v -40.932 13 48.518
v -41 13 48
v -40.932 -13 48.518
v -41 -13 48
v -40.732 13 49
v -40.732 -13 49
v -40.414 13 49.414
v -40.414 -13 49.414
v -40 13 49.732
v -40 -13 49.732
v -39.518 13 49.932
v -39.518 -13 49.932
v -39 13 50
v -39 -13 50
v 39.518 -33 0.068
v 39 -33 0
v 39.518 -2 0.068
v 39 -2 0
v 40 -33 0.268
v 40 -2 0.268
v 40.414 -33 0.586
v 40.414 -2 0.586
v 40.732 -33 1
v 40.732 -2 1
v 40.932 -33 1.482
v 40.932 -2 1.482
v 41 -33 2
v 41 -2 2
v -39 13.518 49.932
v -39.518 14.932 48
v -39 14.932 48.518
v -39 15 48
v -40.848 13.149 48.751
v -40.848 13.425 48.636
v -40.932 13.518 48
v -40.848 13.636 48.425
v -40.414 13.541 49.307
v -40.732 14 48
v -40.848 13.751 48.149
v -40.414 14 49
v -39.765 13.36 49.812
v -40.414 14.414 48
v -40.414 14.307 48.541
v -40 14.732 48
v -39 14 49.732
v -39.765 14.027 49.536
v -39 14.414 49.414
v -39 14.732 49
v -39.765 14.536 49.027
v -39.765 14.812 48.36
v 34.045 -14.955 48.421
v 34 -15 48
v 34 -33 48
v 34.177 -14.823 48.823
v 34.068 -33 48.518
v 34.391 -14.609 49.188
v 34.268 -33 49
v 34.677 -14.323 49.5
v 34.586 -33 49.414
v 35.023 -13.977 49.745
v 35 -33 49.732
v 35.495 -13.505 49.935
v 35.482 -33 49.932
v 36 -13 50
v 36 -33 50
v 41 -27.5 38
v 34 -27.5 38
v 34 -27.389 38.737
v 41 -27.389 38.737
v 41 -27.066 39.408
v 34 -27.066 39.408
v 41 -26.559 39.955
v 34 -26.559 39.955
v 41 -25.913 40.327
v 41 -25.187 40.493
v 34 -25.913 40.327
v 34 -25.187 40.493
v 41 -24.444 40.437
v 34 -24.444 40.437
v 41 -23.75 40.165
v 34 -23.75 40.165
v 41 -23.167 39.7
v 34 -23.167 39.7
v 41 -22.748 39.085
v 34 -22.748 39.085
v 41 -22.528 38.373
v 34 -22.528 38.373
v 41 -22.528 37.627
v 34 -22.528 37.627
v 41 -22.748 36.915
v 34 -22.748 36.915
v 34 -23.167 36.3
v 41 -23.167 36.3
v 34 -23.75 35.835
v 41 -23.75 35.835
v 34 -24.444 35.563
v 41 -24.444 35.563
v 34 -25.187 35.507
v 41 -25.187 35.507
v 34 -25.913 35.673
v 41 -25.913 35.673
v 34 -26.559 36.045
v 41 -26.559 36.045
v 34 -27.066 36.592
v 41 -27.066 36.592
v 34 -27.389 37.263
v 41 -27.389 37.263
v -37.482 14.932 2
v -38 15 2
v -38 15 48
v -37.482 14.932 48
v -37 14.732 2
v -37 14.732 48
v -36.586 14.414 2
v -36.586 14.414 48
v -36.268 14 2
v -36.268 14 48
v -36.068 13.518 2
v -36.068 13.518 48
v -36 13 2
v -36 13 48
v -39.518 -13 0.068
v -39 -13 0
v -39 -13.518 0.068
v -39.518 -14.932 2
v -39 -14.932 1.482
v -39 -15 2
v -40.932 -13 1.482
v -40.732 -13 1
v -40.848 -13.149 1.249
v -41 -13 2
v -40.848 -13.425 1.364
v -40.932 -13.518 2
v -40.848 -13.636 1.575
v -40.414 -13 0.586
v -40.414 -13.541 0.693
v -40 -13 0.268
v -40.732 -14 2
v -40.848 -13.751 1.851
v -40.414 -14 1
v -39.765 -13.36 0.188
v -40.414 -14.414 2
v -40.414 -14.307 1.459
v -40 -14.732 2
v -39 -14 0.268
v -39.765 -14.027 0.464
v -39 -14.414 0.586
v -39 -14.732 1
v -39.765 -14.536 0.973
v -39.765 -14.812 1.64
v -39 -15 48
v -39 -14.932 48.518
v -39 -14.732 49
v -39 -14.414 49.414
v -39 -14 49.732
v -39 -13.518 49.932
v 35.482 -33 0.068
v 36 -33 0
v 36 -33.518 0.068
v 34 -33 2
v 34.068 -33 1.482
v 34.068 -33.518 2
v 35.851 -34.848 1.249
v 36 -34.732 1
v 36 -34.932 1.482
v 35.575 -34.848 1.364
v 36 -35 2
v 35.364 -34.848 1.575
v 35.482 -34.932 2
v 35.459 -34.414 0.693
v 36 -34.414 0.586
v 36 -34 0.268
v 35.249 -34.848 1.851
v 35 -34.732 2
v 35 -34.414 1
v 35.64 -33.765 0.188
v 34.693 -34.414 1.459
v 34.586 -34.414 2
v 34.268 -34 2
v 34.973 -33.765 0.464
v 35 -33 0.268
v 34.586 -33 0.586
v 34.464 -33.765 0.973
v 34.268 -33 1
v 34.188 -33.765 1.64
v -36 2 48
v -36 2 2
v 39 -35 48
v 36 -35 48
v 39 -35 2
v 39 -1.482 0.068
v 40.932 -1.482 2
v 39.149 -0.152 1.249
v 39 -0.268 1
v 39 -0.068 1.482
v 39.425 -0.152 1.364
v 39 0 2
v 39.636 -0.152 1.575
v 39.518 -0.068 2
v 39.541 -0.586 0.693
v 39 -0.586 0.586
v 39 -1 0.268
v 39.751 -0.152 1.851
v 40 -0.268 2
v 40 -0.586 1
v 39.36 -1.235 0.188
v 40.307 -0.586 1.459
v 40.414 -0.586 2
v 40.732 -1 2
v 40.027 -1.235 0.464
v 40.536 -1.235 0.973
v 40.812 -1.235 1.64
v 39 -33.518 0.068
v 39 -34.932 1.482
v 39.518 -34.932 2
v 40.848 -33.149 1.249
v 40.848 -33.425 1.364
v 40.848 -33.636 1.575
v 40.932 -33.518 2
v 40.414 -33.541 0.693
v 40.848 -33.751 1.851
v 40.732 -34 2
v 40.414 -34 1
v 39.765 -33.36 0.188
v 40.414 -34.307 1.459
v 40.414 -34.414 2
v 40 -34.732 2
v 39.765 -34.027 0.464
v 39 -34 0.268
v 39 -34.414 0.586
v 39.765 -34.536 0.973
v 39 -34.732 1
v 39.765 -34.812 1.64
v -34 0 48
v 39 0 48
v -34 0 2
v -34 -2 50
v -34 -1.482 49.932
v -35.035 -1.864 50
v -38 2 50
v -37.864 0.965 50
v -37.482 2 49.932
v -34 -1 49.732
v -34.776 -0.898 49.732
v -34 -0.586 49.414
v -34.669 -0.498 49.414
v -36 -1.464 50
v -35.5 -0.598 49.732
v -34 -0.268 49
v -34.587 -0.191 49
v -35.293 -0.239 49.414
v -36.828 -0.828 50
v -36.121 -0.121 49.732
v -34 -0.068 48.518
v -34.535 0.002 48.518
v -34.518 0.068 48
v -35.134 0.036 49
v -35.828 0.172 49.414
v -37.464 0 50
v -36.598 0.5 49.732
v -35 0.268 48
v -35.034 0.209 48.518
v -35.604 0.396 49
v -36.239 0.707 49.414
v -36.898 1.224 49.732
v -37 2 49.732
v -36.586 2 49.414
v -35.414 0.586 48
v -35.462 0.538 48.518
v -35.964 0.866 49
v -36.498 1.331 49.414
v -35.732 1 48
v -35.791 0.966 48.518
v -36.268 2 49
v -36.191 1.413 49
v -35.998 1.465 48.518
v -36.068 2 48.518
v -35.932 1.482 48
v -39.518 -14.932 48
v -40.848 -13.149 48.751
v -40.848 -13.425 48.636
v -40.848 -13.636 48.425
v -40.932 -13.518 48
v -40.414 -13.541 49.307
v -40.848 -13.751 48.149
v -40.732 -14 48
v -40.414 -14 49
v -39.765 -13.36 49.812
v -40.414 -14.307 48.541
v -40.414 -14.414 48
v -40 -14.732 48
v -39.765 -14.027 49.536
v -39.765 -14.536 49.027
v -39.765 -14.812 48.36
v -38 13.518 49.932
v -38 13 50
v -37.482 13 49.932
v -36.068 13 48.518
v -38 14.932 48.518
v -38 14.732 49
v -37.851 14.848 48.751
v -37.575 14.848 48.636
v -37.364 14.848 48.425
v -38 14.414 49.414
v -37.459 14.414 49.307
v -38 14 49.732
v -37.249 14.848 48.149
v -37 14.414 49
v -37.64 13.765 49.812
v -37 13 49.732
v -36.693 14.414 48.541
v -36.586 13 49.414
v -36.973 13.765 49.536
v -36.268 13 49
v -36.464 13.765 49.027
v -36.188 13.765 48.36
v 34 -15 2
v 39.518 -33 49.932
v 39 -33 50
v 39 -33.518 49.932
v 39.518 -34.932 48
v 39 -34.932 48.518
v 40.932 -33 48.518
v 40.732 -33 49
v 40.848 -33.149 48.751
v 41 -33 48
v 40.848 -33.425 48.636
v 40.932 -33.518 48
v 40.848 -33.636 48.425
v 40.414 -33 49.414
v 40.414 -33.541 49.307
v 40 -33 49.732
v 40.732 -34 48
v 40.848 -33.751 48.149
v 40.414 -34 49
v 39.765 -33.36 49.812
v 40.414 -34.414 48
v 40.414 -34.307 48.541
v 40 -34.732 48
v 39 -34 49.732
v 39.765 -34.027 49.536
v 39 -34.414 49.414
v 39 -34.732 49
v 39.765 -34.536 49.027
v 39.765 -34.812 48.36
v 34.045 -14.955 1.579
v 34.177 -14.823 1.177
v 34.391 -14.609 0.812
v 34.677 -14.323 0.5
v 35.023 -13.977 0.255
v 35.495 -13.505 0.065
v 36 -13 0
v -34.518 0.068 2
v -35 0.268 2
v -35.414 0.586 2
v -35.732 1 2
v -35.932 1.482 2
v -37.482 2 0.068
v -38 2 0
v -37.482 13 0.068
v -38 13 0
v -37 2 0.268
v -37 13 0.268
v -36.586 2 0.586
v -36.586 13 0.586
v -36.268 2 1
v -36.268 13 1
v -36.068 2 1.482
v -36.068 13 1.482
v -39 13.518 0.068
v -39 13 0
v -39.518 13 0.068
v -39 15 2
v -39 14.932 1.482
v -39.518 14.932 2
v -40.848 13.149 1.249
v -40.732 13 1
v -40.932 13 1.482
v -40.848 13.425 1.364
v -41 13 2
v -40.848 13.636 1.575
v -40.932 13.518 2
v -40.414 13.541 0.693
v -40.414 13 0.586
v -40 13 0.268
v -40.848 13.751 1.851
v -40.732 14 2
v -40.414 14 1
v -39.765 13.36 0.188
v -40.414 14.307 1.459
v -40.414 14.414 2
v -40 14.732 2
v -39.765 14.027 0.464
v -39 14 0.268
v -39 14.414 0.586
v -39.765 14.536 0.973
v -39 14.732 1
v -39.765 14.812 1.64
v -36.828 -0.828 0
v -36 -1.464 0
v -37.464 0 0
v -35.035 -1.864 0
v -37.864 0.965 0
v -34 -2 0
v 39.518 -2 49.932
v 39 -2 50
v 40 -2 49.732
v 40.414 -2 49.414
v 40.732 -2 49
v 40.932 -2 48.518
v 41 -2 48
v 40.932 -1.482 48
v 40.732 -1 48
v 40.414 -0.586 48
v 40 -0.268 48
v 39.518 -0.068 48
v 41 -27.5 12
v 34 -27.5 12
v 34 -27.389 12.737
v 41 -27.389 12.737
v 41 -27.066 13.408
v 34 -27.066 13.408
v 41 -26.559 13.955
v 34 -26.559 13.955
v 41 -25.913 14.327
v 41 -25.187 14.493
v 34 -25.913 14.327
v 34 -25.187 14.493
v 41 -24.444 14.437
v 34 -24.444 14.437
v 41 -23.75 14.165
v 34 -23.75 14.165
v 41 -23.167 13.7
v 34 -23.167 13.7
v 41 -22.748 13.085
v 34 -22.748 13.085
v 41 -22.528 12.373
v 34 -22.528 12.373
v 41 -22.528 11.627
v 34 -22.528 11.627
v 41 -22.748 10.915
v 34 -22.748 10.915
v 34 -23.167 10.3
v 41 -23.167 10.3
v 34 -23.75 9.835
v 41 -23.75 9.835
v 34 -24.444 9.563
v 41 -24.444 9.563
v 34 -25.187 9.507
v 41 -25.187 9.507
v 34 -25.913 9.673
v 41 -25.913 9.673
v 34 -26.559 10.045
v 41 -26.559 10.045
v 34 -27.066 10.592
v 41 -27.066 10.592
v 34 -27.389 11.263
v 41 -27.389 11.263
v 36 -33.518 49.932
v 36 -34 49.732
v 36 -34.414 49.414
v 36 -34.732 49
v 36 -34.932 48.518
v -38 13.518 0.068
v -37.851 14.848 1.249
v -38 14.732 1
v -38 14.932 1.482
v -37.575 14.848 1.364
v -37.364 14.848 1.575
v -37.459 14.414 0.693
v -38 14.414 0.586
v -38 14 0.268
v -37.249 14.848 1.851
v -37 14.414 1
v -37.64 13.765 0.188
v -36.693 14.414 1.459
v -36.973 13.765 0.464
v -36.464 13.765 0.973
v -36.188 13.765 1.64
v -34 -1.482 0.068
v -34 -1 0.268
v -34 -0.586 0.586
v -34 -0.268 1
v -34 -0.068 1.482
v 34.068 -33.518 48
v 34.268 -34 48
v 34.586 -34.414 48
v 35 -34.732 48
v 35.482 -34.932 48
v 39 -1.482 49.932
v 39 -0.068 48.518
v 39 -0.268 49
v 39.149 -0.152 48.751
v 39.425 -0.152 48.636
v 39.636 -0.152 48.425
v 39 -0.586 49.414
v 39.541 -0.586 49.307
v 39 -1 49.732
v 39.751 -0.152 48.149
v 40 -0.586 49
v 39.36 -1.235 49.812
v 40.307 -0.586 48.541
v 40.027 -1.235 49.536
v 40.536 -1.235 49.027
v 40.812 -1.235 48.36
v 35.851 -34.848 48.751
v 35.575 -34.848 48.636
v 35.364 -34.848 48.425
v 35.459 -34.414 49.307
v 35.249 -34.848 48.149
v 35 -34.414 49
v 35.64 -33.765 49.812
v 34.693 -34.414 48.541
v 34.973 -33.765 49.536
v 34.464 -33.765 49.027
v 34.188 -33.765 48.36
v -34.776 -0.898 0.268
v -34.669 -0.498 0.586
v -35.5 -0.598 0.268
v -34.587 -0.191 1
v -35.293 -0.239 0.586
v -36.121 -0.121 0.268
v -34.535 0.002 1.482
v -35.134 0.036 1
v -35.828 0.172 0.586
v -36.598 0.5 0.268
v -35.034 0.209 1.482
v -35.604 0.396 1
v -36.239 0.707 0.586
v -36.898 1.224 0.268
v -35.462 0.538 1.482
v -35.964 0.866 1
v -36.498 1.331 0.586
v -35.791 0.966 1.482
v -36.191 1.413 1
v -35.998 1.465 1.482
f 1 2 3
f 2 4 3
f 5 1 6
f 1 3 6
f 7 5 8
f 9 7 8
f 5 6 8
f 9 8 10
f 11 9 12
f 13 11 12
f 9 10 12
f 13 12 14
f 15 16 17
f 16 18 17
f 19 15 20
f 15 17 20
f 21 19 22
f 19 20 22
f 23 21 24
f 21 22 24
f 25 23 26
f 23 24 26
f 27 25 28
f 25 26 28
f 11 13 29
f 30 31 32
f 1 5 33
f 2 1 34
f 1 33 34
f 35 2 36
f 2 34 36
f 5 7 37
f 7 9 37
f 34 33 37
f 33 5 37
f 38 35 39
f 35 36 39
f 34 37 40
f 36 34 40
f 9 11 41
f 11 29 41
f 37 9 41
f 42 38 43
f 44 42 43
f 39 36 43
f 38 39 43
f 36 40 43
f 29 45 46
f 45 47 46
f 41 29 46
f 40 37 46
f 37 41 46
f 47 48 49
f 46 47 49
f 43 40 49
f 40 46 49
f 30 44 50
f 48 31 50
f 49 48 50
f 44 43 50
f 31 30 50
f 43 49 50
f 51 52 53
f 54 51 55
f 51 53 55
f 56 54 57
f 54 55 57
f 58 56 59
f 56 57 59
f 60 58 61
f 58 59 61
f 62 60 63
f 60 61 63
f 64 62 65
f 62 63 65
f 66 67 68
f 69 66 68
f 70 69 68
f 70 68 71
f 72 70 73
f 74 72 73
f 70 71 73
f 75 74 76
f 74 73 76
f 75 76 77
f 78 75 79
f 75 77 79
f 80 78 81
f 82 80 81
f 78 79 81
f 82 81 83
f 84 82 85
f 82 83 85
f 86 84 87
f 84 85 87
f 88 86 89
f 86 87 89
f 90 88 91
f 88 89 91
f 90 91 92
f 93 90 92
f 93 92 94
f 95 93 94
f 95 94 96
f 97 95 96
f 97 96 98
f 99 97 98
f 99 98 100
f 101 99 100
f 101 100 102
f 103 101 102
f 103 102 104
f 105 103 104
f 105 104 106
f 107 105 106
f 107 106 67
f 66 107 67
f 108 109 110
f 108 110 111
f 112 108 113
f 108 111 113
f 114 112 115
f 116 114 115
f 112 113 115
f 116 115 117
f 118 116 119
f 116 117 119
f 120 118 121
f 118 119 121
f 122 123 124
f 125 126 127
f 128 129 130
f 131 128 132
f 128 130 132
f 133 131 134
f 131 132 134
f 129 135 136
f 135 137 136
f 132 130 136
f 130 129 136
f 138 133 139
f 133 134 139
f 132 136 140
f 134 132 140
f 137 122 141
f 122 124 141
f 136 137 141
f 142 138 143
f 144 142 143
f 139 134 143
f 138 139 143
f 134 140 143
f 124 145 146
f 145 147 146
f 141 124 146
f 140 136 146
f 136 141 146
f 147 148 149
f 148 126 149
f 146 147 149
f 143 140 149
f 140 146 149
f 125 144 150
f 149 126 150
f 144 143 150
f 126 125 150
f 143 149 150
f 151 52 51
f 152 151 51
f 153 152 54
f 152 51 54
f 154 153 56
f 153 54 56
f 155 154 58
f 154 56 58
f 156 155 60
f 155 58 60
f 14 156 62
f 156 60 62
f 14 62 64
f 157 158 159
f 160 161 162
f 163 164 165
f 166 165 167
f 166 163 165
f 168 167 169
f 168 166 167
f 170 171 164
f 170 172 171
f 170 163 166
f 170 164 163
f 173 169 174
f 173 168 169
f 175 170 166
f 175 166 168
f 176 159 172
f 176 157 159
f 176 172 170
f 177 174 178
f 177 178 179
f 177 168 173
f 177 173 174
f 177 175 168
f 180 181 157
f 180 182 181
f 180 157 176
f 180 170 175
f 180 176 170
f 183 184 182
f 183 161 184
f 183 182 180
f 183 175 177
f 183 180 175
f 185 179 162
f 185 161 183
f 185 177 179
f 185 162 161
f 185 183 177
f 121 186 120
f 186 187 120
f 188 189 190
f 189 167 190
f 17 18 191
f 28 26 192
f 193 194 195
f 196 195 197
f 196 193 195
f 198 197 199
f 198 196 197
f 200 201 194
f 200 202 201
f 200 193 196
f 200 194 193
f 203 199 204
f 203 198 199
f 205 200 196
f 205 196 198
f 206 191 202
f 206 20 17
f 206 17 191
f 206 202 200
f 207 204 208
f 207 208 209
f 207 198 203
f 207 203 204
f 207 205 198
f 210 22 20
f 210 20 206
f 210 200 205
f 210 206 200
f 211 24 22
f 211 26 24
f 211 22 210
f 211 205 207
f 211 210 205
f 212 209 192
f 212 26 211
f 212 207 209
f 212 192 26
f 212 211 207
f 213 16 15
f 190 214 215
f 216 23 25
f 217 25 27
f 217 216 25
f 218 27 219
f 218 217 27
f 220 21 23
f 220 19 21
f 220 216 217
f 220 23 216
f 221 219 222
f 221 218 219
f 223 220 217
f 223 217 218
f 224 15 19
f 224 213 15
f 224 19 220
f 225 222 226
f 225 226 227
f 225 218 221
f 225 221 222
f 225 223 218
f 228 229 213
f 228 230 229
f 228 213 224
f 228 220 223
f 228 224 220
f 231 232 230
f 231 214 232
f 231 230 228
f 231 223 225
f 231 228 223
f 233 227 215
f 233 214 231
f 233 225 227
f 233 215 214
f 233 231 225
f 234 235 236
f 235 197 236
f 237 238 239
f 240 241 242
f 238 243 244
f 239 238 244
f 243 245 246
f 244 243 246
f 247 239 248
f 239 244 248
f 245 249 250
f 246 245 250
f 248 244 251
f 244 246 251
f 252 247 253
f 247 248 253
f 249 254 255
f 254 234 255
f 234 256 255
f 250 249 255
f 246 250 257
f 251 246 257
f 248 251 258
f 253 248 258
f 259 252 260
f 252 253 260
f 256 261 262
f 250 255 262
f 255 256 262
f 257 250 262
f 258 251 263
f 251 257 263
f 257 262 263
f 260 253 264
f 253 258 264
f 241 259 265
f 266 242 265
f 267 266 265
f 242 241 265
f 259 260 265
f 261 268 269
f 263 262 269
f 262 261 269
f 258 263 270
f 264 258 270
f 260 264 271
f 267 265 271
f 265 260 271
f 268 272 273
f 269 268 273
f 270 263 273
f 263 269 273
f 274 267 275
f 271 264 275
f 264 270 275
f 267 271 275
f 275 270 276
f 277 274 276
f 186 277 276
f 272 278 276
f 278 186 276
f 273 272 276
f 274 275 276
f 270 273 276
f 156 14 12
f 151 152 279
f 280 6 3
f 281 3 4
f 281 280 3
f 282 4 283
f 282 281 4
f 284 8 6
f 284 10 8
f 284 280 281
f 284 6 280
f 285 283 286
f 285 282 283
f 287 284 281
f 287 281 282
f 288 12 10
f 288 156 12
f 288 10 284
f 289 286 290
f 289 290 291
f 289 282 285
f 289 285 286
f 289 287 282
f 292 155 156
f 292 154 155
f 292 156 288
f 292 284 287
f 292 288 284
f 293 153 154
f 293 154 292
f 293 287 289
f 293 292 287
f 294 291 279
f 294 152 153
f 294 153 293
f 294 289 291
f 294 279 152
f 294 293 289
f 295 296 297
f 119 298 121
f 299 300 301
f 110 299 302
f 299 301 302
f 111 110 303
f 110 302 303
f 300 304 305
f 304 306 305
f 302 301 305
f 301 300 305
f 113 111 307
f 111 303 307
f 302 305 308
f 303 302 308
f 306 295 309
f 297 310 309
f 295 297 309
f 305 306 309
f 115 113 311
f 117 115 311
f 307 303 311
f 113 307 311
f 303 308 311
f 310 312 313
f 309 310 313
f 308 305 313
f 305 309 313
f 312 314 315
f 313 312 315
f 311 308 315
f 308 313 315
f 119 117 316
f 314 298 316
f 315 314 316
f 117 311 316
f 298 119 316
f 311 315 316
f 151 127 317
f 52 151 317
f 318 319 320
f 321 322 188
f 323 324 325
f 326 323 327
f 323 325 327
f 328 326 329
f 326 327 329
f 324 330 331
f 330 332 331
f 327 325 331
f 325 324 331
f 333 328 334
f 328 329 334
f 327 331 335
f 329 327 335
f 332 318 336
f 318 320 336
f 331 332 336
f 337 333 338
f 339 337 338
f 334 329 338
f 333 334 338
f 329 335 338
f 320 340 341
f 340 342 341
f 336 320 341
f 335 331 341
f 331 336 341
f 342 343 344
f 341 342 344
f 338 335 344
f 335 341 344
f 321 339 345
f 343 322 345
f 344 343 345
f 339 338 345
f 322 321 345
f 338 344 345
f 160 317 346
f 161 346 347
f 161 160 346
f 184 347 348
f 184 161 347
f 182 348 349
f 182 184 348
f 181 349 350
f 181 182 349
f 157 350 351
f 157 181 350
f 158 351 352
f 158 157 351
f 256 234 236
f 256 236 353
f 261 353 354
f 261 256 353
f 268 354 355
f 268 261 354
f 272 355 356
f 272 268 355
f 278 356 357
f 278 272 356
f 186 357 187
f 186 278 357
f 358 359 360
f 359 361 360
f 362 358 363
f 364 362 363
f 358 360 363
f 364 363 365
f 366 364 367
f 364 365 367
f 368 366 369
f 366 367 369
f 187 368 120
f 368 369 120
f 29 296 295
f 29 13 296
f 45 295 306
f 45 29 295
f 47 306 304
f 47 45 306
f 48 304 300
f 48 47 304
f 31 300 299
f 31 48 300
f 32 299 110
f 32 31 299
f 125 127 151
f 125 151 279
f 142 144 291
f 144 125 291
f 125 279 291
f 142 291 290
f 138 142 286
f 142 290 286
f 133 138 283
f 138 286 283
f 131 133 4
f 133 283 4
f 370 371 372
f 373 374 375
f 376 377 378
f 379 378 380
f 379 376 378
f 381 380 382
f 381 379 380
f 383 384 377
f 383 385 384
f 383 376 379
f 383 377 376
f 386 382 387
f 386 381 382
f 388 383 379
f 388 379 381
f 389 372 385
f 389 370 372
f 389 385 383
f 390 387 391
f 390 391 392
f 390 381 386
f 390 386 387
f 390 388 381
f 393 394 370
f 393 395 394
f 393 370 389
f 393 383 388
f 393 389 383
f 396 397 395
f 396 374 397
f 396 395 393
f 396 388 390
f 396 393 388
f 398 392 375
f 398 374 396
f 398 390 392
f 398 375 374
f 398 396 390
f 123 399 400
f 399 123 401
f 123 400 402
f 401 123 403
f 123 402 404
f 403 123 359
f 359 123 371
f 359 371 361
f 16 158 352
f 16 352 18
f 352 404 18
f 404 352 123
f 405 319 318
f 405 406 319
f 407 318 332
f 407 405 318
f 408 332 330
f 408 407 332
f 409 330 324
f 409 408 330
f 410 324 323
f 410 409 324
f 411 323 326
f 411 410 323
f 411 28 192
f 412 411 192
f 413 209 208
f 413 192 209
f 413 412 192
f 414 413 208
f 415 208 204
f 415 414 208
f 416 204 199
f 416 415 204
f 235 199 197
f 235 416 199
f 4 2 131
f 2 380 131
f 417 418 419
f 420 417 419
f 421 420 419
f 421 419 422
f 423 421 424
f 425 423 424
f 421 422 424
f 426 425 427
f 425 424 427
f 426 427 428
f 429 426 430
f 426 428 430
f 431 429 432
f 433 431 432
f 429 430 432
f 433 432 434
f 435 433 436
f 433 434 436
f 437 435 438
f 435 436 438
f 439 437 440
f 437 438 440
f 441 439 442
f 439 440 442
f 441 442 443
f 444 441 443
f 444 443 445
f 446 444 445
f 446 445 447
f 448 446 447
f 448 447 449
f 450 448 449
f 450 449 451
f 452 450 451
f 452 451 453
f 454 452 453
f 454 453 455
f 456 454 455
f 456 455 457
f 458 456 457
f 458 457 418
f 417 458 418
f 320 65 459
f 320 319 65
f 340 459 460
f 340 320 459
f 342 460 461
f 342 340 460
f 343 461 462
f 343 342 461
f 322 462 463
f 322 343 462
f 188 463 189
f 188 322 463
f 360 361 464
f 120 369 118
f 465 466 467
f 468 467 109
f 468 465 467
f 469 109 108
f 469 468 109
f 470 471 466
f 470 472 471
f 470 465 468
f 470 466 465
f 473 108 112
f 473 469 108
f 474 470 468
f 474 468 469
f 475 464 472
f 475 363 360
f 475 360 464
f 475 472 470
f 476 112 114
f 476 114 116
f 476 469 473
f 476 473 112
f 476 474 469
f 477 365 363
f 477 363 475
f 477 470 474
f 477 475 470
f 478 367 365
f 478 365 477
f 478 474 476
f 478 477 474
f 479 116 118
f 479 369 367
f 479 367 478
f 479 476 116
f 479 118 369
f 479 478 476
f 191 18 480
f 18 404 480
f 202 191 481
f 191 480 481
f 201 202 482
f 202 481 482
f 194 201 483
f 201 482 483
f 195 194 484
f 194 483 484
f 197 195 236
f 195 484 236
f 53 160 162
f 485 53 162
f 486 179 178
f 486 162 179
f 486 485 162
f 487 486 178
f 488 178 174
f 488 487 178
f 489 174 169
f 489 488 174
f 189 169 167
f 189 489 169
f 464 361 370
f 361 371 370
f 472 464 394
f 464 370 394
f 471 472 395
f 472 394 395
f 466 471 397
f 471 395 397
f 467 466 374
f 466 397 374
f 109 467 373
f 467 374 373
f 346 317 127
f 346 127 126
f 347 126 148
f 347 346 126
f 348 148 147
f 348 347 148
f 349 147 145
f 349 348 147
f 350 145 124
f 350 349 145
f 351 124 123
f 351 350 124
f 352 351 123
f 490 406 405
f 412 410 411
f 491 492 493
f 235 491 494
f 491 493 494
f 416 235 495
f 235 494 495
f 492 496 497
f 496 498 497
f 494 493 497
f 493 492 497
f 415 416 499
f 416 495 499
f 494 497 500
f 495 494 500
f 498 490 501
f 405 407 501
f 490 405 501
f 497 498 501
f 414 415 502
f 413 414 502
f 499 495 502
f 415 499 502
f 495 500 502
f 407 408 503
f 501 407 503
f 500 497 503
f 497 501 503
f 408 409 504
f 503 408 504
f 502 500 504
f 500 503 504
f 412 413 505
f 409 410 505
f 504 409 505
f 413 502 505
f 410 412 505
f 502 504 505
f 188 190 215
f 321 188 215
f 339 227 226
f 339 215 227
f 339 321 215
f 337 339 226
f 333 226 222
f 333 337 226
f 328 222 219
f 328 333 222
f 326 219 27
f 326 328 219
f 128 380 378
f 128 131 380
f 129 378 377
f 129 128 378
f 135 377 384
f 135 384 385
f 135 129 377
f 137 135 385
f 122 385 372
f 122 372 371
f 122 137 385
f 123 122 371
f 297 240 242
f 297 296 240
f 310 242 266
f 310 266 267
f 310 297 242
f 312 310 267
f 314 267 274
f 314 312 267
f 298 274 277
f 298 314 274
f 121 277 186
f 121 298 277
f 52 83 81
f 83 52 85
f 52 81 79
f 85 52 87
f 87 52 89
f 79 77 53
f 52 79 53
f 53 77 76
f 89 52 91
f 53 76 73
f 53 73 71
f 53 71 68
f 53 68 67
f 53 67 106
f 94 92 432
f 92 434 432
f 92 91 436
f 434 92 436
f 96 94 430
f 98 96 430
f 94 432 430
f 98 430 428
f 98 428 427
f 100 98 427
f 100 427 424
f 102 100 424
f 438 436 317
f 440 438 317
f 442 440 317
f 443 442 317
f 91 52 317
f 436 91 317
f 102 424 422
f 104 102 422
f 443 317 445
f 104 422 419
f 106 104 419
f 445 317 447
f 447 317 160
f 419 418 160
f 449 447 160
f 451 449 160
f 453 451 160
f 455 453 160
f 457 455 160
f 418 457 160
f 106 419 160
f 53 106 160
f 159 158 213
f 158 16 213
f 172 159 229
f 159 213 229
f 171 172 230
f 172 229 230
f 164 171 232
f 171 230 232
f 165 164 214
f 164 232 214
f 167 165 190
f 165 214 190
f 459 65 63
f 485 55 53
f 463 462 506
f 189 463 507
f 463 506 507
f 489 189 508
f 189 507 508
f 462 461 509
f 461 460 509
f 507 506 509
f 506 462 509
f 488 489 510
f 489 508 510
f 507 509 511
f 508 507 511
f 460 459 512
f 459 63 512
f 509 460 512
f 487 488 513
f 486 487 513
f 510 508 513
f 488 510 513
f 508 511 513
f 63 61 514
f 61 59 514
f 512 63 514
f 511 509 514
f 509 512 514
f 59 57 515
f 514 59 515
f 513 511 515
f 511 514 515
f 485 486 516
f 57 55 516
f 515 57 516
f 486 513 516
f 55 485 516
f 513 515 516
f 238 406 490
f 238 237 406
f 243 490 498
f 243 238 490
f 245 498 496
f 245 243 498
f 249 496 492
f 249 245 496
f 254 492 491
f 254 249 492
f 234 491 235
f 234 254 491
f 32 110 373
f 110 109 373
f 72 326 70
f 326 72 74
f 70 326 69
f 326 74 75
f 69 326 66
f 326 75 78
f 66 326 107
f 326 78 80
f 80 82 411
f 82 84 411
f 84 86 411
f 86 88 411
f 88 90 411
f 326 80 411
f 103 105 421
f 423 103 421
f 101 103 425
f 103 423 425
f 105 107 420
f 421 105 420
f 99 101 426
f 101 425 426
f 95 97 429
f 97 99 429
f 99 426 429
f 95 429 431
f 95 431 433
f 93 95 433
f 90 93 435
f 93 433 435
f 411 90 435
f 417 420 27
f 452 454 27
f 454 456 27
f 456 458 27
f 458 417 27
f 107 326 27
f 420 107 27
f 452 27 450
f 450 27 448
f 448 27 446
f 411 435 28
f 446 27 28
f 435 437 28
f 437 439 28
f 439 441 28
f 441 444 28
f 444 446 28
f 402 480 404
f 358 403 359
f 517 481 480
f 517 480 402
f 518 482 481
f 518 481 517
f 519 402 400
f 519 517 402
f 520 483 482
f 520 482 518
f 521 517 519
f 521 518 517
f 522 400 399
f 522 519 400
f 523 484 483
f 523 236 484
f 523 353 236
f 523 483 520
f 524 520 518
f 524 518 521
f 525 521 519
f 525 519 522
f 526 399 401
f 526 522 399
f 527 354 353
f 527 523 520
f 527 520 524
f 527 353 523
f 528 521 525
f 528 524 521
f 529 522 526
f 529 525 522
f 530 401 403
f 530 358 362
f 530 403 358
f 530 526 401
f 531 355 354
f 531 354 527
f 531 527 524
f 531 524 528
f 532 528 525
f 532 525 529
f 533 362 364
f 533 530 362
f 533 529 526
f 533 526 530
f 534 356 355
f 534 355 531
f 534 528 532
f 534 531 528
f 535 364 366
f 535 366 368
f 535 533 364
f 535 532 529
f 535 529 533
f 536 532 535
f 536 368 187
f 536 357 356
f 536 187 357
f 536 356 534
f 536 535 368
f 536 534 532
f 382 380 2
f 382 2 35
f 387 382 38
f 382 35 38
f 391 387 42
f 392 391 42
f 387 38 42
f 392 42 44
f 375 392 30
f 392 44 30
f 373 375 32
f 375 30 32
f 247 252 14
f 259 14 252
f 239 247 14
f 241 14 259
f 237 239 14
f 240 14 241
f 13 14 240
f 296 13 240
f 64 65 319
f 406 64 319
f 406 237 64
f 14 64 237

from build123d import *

# Parameters (mm, degrees)
F1_DEPTH = 50
F2_R     = 2.5
F3_DEPTH = 25
F4_R     = 2


with BuildPart() as f1:
    # F0 (on Top) → F1 (new body)
    with BuildSketch(Plane.XY):
        Polygon((-41, -15), (34, -15), (34, -35), (41, -35), (41, -15), (41, 0), (-36, 0), (-36, 15), (-41, 15), align=None)
    extrude(amount=F1_DEPTH)

    # F2 (on face) → F3 (cut)
    with BuildSketch(Plane(origin=(34, 0, 0), x_dir=(0, -1, 0), z_dir=(-1, 0, 0))):
        with Locations((25, 12)):
            Circle(F2_R)
        with Locations((25, 38)):
            Circle(F2_R)
    extrude(amount=-F3_DEPTH, mode=Mode.SUBTRACT)

    # F4
    f4_edges = [f1.edges().sort_by_distance(p)[0] for p in [
        (-3.5, -15, 50),
        (34, -25, 50),
        (37.5, -35, 50),
        (41, -17.5, 50),
        (2.5, 0, 50),
        (-36, 7.5, 50),
        (-38.5, 15, 50),
        (-41, 0, 50),
        (-3.5, -15, 0),
        (34, -25, 0),
        (37.5, -35, 0),
        (41, -17.5, 0),
        (2.5, 0, 0),
        (-36, 7.5, 0),
        (-38.5, 15, 0),
        (-41, 0, 0),
        (34, -35, 25),
        (-41, -15, 25),
        (-41, 15, 25),
        (-36, 15, 25),
        (41, 0, 25),
        (-36, 0, 25),
        (41, -35, 25),
    ]]
    fillet(f4_edges, radius=F4_R)


solid = f1.part
